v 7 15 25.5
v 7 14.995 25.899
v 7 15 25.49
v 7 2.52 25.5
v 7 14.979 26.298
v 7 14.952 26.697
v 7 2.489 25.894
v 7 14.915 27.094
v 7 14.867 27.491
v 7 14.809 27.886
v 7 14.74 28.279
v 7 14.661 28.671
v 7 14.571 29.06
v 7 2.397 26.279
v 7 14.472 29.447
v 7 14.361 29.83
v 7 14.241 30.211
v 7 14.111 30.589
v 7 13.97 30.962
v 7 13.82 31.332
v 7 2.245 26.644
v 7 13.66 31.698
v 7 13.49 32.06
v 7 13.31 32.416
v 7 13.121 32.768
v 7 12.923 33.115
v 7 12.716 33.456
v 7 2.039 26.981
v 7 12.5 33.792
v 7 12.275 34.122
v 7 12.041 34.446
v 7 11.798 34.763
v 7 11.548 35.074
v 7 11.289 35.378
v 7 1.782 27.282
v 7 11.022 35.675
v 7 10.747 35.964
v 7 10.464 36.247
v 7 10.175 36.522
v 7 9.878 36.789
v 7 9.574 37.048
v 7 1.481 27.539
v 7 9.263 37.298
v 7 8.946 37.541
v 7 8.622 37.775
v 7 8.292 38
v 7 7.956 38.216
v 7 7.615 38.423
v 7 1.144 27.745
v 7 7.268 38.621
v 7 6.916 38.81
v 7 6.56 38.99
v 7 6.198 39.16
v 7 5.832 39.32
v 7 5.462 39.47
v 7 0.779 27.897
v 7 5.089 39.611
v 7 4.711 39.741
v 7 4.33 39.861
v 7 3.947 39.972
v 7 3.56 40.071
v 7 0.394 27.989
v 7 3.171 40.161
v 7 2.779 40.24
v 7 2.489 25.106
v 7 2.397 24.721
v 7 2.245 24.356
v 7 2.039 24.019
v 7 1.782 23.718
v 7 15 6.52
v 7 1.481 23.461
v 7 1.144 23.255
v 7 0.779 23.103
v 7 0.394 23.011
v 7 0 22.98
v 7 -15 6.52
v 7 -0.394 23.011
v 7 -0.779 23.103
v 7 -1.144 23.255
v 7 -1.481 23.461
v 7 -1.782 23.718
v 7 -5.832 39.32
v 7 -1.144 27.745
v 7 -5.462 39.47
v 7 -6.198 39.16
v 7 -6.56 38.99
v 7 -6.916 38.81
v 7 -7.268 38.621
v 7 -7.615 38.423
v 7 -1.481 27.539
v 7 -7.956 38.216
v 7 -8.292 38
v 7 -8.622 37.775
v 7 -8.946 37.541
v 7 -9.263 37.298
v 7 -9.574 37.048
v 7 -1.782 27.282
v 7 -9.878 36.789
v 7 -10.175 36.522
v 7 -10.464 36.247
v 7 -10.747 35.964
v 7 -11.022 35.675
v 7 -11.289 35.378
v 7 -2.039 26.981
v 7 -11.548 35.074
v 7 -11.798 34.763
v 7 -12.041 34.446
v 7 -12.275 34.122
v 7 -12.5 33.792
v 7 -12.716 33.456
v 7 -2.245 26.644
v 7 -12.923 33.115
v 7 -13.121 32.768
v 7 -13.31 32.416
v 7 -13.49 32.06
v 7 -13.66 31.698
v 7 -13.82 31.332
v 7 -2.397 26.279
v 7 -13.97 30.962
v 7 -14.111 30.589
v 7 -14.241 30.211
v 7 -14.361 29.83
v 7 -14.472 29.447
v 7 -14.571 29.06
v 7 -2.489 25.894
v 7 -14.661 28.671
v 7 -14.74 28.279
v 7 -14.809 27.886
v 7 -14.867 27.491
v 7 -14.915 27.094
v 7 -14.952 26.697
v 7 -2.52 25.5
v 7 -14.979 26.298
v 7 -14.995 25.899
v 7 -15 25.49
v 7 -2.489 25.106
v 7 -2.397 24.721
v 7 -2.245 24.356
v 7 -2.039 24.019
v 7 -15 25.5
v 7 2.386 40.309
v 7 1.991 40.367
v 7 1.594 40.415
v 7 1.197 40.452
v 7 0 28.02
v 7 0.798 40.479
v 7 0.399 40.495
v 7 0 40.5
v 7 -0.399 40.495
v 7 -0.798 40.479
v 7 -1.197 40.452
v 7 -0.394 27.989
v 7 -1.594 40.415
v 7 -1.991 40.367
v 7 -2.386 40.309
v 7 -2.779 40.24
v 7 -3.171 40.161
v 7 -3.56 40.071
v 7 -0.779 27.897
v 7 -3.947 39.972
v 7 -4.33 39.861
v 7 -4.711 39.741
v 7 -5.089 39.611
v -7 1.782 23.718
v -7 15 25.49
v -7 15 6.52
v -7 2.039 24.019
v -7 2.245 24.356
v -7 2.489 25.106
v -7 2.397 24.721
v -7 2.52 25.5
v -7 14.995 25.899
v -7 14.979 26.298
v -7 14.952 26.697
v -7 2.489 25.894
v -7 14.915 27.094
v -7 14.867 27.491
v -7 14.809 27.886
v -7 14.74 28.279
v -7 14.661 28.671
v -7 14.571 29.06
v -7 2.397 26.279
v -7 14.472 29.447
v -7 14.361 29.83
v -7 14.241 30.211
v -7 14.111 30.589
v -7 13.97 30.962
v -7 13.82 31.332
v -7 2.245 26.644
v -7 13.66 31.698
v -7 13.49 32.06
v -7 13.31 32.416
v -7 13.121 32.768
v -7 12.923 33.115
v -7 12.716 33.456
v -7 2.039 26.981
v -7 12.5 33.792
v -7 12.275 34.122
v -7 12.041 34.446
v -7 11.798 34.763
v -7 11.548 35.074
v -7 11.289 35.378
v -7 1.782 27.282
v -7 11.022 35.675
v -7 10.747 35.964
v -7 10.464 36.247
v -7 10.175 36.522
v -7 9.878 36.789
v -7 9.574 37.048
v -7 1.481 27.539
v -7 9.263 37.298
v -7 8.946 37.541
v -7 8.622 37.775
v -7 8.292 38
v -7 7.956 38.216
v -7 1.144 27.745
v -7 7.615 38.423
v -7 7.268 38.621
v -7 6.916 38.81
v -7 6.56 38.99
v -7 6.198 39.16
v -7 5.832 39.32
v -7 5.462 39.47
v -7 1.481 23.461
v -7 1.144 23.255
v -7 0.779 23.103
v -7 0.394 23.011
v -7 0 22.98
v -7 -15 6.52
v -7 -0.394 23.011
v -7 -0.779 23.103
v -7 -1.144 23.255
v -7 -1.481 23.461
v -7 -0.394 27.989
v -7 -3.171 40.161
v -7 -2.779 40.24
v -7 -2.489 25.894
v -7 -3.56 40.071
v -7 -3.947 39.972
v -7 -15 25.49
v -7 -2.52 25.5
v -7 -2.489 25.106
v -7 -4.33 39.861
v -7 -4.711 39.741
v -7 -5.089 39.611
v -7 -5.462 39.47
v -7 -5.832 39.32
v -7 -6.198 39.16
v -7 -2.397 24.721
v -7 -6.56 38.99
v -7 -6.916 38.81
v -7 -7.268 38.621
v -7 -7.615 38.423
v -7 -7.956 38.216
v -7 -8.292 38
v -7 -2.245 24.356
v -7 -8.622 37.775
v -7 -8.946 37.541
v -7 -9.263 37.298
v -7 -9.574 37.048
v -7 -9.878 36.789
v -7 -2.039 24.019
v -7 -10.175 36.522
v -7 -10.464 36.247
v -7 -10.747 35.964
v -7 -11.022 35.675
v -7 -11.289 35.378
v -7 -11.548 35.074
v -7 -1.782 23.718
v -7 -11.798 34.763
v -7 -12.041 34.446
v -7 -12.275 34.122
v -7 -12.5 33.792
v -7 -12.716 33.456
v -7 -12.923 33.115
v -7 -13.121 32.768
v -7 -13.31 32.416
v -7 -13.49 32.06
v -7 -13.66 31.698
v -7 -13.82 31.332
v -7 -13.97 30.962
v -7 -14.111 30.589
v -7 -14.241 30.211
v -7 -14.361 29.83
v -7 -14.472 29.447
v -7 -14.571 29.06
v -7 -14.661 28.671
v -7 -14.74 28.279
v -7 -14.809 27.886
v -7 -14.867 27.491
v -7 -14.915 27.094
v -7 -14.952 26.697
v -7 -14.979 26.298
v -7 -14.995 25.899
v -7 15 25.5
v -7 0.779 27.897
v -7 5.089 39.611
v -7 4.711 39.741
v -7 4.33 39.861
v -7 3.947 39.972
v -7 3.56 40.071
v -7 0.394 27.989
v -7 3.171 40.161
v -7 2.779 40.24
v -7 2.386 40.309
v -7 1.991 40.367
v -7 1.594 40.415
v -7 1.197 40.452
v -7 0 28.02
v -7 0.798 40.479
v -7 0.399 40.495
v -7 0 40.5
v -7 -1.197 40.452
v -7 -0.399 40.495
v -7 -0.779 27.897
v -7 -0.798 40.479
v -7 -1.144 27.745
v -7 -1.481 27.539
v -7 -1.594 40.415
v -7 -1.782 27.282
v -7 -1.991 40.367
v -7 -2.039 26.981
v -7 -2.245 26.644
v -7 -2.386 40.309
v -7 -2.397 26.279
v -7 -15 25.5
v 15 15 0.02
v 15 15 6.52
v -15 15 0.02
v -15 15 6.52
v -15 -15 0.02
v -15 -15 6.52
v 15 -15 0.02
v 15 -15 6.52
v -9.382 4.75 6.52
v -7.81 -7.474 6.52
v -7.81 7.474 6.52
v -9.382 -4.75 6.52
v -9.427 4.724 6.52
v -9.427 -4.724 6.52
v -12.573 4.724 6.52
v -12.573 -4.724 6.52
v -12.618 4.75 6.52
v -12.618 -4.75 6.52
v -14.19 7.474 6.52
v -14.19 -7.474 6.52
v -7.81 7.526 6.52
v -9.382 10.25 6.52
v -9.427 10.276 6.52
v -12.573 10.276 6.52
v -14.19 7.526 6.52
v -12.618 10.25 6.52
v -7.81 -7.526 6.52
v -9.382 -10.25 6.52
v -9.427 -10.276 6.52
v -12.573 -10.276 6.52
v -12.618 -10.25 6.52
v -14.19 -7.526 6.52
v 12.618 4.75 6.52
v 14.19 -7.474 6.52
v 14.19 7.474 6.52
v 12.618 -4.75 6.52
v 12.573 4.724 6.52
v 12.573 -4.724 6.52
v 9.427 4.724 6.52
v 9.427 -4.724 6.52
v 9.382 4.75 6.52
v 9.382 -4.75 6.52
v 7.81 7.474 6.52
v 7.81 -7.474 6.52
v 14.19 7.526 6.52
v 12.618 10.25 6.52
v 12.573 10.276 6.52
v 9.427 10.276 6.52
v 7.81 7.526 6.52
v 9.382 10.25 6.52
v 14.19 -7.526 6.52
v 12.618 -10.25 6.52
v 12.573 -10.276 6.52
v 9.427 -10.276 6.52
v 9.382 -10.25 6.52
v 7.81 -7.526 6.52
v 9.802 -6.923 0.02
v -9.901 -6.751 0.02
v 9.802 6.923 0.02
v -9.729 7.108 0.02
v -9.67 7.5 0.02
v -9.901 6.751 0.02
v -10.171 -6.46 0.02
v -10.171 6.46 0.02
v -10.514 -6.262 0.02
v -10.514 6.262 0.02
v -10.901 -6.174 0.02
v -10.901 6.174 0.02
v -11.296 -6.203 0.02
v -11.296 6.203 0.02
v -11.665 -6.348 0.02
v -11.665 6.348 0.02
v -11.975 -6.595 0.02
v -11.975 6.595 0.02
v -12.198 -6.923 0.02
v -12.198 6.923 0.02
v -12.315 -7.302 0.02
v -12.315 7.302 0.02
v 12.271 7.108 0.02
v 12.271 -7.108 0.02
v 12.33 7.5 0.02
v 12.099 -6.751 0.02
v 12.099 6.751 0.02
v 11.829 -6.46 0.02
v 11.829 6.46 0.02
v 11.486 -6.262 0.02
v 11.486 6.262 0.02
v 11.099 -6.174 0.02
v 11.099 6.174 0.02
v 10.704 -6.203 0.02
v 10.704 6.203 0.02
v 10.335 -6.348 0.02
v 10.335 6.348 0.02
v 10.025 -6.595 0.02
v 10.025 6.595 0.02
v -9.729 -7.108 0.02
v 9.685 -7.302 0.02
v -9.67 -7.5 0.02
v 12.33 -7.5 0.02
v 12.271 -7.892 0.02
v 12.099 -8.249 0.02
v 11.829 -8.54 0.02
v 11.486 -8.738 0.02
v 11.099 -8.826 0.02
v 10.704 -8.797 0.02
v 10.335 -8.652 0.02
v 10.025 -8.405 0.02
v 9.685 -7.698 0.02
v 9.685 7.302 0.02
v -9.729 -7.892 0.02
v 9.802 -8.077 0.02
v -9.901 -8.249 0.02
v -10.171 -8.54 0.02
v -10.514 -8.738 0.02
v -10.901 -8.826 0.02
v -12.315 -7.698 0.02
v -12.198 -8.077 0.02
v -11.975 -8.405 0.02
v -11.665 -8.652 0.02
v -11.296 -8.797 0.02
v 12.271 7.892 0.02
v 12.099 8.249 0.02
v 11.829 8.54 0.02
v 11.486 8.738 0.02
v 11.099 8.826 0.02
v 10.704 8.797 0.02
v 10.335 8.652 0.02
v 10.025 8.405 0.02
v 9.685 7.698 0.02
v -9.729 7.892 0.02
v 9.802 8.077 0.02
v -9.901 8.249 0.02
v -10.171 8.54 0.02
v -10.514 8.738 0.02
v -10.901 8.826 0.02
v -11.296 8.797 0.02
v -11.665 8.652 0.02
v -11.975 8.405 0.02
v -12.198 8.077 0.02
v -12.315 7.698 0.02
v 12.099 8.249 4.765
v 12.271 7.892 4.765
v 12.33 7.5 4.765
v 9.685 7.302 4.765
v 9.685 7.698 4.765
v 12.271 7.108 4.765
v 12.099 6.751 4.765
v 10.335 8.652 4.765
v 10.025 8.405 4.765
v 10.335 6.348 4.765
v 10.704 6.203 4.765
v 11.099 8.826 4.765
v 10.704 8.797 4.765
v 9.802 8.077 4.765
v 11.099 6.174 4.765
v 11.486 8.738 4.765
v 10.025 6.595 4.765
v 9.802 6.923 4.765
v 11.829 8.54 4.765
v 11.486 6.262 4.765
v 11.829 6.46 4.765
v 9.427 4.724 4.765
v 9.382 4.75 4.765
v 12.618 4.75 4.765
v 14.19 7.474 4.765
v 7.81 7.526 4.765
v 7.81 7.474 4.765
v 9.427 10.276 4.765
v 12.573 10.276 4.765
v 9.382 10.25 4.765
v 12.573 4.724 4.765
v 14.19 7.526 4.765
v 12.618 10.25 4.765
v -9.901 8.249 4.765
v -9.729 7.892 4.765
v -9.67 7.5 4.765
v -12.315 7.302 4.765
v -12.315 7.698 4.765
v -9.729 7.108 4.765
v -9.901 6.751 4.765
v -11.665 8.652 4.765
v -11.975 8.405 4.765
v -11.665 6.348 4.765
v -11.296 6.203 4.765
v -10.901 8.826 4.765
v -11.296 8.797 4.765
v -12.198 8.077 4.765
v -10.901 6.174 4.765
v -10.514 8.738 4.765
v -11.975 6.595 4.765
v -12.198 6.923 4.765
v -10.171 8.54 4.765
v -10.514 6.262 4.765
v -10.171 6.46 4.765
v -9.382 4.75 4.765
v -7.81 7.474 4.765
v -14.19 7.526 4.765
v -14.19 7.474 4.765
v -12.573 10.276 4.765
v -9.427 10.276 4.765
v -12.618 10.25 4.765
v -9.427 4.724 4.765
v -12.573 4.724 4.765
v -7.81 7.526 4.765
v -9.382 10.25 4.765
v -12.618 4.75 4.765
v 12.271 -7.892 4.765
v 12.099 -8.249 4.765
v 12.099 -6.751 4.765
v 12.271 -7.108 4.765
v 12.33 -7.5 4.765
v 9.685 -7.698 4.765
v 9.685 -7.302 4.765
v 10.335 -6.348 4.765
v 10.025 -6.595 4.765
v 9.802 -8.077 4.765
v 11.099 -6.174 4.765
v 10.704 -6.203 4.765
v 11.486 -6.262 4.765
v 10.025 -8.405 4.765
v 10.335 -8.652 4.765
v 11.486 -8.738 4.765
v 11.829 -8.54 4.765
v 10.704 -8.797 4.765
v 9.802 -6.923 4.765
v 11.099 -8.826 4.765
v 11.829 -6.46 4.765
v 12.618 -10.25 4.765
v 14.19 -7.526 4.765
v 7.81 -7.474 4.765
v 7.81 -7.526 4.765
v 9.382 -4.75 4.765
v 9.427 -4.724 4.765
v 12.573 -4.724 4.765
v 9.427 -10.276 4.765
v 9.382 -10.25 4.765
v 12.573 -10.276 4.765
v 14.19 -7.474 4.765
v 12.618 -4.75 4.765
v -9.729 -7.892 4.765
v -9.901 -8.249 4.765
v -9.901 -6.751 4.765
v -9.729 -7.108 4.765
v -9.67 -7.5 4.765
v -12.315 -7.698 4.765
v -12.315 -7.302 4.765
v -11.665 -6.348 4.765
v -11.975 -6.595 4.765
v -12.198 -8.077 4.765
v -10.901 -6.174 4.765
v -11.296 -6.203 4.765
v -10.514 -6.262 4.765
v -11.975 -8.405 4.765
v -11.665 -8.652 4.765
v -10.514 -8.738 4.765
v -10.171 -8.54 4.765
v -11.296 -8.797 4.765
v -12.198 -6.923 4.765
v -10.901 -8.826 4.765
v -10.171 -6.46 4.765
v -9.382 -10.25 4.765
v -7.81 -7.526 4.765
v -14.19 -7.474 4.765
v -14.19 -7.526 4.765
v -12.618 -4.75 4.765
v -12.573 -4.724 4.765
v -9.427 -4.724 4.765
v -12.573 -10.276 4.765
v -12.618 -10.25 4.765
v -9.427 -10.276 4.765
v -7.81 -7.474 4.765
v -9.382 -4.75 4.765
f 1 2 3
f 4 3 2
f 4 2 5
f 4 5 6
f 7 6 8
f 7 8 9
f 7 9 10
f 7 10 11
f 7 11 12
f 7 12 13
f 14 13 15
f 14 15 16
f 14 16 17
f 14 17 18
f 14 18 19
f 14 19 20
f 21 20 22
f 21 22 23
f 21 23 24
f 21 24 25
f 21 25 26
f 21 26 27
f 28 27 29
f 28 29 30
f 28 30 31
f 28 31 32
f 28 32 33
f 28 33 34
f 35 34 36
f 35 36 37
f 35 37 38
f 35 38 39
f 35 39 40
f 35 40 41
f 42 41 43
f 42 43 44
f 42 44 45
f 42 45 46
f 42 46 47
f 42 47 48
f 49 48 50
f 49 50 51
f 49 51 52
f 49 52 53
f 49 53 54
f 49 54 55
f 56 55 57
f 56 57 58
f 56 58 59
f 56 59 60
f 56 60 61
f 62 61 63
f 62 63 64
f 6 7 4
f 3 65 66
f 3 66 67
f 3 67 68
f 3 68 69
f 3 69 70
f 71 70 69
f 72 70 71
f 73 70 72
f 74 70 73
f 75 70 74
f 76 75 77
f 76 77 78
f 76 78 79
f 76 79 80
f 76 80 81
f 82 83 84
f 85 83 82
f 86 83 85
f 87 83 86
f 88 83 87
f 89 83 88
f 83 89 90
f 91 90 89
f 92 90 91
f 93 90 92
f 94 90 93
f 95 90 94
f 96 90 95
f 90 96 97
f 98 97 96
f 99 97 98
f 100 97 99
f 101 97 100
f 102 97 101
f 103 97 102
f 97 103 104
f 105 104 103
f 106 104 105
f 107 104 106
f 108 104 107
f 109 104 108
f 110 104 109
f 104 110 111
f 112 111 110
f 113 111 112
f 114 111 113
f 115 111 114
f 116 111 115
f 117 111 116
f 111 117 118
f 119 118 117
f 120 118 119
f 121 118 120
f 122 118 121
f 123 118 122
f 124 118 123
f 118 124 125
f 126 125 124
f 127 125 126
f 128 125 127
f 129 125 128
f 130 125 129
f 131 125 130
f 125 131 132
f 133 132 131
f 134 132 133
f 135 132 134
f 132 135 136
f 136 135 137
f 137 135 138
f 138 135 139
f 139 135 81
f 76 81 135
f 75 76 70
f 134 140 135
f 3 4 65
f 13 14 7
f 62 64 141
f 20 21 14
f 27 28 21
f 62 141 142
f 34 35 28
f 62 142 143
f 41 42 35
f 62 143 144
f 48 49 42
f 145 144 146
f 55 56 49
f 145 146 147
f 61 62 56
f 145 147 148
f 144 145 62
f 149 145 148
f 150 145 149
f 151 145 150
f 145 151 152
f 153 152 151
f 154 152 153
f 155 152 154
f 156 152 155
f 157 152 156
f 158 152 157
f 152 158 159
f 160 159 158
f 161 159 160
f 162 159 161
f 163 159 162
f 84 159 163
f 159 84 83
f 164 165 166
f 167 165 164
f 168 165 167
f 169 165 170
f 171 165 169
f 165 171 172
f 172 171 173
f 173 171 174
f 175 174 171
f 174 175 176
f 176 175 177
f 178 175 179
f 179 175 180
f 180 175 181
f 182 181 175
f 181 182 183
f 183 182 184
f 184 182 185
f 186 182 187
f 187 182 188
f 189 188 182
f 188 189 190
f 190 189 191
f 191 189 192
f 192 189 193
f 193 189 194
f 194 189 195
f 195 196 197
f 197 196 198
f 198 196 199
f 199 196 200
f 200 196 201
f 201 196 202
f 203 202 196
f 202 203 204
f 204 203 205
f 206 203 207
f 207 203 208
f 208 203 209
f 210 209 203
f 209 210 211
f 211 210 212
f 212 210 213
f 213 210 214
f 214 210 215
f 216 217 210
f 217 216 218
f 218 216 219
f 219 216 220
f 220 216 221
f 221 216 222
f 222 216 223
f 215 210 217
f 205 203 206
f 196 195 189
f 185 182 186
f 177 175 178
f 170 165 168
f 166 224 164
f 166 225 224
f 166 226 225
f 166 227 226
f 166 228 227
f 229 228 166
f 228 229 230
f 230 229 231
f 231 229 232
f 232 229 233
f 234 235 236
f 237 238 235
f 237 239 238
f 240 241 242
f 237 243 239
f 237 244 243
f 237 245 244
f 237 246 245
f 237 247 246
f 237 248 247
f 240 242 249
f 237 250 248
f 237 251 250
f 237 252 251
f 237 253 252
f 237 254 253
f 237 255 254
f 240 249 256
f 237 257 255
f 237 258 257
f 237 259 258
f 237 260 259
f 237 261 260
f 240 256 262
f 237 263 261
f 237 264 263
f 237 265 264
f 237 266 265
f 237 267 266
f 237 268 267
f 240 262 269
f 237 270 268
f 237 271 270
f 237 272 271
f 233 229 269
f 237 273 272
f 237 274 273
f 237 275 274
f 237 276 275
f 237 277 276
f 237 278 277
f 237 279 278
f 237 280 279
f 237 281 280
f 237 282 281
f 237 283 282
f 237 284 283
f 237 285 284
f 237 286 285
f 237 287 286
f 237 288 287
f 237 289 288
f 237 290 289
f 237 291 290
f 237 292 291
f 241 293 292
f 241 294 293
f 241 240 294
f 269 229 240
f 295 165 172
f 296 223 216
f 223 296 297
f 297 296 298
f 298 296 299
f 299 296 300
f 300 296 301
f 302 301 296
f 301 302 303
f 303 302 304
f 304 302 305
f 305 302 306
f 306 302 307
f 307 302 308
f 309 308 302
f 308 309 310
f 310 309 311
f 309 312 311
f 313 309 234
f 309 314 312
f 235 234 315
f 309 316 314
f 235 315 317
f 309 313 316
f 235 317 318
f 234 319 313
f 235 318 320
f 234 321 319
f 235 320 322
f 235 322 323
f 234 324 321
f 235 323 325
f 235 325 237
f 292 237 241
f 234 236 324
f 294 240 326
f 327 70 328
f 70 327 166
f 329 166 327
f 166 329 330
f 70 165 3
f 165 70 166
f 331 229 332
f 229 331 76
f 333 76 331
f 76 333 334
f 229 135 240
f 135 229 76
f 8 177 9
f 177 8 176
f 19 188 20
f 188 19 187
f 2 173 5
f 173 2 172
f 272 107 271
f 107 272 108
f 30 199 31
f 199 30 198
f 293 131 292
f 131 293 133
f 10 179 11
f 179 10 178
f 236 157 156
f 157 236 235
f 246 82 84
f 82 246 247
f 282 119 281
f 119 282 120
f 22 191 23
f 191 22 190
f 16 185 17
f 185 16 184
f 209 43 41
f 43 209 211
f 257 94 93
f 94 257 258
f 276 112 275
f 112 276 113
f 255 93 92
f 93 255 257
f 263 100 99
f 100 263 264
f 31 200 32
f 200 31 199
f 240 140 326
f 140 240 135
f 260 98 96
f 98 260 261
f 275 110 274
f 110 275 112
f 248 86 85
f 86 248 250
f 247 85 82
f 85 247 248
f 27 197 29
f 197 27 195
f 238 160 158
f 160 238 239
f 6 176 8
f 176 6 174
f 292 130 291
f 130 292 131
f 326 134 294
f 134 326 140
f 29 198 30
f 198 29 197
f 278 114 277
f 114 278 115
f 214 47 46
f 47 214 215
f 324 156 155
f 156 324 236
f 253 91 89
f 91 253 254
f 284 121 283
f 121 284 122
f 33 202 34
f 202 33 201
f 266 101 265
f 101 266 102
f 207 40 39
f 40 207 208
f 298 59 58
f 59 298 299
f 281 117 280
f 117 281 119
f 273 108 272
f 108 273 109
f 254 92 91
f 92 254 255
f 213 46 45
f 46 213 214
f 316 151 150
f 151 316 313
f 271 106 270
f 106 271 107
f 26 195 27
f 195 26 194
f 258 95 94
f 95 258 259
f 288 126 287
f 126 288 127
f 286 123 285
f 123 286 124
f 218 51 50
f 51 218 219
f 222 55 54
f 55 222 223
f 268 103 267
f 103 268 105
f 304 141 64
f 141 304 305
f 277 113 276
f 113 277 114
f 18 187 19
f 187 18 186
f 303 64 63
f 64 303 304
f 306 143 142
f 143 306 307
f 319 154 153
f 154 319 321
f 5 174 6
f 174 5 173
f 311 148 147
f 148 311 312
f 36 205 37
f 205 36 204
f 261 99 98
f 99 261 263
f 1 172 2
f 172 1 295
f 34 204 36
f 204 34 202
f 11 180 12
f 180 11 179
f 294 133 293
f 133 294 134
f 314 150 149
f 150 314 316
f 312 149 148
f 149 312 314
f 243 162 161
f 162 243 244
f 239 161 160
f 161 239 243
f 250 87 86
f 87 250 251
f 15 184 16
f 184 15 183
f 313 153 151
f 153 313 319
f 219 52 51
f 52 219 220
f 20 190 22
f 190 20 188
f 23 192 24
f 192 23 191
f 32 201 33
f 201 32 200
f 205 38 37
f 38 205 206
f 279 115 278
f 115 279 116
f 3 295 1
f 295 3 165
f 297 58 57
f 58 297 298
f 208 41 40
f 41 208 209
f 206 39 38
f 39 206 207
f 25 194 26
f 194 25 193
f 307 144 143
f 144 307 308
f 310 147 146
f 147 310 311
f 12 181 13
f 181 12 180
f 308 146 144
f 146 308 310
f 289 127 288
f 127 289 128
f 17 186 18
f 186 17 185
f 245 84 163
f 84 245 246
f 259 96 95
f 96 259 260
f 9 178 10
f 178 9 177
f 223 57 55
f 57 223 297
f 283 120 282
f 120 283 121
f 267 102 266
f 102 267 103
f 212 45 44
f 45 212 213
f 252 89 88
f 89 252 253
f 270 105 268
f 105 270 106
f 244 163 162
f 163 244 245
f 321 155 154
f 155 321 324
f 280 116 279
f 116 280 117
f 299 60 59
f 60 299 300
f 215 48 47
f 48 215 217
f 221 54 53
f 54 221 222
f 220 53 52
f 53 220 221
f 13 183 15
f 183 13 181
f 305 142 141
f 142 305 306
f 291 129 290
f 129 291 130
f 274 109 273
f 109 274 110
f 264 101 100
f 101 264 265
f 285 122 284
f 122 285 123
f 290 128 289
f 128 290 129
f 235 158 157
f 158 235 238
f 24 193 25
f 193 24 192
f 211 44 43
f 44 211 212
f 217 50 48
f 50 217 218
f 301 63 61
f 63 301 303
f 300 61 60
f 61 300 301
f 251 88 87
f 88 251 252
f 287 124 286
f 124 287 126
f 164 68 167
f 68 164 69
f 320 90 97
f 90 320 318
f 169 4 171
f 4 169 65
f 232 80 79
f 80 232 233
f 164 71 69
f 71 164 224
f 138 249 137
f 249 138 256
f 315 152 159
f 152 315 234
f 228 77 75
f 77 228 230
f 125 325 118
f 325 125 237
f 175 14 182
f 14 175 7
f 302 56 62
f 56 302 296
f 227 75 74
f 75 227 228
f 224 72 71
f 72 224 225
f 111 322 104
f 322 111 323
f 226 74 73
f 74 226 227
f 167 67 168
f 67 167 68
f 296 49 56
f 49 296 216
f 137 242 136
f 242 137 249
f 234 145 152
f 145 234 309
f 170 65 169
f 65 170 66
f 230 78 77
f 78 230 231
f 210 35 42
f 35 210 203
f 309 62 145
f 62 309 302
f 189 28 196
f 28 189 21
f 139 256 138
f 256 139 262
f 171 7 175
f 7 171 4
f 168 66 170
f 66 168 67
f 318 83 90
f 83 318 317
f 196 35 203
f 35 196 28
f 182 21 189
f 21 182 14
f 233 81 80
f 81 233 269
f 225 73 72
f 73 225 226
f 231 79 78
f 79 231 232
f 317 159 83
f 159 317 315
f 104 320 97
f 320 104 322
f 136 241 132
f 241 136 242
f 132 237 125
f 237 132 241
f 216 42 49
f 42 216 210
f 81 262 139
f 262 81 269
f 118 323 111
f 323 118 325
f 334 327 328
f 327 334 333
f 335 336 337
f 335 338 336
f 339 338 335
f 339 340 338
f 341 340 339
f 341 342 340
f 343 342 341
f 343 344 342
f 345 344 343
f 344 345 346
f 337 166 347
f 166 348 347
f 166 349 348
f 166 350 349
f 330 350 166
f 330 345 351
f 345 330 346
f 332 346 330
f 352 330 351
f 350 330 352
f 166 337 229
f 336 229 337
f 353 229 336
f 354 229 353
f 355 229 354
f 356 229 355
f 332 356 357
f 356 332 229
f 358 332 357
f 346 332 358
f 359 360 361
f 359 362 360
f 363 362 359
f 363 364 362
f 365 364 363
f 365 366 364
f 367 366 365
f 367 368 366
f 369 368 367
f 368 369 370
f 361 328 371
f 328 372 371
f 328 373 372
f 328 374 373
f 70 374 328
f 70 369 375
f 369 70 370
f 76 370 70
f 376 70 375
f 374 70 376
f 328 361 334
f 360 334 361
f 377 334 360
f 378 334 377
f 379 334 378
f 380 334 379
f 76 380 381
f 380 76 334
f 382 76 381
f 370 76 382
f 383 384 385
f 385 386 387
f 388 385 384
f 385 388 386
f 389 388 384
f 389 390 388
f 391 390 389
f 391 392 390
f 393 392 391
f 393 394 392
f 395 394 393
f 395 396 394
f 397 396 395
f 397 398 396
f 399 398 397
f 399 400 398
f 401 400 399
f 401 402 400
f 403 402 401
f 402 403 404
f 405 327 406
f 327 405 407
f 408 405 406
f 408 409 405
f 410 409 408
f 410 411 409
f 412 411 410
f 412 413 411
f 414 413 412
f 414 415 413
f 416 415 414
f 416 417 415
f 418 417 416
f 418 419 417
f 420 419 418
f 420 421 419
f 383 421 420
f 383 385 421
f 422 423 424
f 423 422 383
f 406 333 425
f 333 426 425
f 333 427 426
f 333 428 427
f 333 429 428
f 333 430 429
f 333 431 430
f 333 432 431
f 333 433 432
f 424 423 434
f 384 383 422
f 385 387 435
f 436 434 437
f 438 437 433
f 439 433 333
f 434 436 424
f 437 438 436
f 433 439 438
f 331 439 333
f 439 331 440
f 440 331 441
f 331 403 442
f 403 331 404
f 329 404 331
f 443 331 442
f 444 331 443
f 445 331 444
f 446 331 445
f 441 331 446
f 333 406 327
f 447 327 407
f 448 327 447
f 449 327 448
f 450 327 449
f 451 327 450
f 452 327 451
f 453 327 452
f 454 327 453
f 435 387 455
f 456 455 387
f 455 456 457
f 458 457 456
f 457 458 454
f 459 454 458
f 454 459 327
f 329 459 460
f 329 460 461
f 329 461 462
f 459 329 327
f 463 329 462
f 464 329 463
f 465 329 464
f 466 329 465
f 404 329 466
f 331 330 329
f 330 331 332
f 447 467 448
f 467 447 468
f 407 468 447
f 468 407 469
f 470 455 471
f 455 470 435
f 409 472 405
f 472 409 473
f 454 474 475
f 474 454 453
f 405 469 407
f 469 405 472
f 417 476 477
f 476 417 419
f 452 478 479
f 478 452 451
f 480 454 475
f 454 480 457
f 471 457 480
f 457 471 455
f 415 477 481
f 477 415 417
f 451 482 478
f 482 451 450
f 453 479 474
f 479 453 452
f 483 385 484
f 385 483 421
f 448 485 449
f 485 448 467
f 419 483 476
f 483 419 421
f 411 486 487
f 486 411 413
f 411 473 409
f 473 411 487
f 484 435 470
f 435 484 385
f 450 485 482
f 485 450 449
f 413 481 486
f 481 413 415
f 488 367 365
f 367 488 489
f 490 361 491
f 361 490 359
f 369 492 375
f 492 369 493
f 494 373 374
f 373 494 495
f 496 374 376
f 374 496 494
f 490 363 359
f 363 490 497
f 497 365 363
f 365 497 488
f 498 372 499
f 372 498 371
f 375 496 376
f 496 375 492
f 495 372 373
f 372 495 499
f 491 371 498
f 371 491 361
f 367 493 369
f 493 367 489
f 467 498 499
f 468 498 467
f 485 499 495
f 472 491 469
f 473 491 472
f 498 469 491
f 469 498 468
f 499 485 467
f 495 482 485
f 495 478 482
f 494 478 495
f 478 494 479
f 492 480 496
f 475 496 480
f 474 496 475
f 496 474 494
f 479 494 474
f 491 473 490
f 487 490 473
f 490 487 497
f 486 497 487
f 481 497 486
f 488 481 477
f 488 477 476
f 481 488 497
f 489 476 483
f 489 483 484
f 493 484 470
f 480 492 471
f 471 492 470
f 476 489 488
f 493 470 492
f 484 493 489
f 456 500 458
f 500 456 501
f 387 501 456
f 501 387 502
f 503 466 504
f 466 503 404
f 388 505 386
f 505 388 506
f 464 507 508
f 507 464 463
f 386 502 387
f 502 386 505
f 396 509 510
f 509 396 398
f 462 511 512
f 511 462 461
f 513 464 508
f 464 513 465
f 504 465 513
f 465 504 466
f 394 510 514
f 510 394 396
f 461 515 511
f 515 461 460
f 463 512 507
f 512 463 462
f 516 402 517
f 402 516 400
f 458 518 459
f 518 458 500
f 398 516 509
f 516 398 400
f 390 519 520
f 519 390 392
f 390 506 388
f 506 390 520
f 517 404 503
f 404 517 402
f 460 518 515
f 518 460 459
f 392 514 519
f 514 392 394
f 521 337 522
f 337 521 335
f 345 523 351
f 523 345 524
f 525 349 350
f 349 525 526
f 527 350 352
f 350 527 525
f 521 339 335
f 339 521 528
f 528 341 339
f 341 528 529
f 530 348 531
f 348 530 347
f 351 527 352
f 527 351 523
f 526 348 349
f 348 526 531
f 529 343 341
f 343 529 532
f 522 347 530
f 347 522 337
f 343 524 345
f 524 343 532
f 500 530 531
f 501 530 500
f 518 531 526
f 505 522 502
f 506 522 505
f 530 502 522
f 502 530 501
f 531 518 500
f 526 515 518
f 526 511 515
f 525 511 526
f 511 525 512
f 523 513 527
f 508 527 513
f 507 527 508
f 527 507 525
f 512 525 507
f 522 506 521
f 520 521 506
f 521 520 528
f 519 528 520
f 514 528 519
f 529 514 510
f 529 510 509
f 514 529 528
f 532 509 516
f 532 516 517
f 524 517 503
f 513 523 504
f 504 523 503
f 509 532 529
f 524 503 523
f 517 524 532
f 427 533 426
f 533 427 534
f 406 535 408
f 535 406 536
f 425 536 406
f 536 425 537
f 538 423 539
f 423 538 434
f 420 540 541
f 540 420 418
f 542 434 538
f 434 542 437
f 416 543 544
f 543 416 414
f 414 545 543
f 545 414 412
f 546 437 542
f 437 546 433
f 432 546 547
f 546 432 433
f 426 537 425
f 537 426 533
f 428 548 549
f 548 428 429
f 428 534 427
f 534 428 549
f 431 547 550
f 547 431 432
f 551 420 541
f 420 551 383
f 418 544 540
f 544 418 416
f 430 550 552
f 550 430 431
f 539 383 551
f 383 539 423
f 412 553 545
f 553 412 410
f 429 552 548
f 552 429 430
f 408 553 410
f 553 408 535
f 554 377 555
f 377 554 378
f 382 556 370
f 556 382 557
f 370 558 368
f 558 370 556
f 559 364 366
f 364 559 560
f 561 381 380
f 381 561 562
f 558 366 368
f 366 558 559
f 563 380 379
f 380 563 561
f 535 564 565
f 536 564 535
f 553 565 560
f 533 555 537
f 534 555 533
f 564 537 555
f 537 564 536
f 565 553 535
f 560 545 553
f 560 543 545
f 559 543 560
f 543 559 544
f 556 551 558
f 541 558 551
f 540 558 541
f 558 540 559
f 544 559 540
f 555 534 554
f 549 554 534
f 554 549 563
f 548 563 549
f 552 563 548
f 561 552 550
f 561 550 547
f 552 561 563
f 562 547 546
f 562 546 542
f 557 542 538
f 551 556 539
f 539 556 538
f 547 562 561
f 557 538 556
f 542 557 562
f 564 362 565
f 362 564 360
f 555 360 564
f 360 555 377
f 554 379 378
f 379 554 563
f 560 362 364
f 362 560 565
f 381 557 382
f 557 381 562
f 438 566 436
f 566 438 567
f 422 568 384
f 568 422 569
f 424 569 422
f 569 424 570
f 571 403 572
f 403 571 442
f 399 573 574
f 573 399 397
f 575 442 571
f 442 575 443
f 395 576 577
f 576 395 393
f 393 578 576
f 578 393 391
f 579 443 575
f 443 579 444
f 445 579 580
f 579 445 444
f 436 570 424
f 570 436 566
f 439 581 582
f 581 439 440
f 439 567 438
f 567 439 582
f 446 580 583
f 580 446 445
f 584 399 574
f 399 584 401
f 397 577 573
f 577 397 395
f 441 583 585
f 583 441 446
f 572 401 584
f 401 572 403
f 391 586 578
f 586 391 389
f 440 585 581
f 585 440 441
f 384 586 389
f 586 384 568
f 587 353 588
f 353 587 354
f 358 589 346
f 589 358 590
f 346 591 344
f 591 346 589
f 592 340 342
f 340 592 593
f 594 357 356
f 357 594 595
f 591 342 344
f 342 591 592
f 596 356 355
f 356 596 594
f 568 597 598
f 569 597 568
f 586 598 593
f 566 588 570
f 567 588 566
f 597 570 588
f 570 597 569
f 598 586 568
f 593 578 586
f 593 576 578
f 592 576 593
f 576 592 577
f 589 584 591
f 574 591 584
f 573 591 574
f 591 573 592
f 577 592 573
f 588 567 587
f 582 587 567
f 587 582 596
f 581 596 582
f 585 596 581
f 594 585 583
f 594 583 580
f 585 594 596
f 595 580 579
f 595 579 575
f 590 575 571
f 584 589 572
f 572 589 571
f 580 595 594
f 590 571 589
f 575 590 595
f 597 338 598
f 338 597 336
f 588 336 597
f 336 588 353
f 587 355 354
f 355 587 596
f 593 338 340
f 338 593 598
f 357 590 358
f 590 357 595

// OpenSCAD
$fa = 1;
$fs = 0.4;

module phex(wid,rad,height){
hull(){
translate([wid/2-rad,0,0])cylinder(r=rad,h=height);
rotate([0,0,60])translate([wid/2-rad,0,0])cylinder(r=rad,h=height);
rotate([0,0,120])translate([wid/2-rad,0,0])cylinder(r=rad,h=height);
rotate([0,0,180])translate([wid/2-rad,0,0])cylinder(r=rad,h=height);
rotate([0,0,240])translate([wid/2-rad,0,0])cylinder(r=rad,h=height);
rotate([0,0,300])translate([wid/2-rad,0,0])cylinder(r=rad,h=height);

}
}

module fhex(wid,height){
hull(){
cube([wid/1.7,wid,height],center = true);
rotate([0,0,120])cube([wid/1.7,wid,height],center = true);
rotate([0,0,240])cube([wid/1.7,wid,height],center = true);
}
}



translate([0,0,19/2+6.5-0.01])

difference(){
cube([14,30,19],center=true);

translate([0,0,19/2])
rotate([0,90,0])
cylinder(h=14+0.001,r=5.04/2,center=true);

}



translate([0,0,19+6.5])
rotate([0,90,0])
difference(){
cylinder(h=14,r=15,center=true);
cylinder(h=14+0.001,r=5.04/2,center=true);
}

translate([0,0,6.5/2+0.02])
difference(){
color([1,0,0])cube([30,30,6.5],center=true);

translate([11,7.5,0])
cylinder(h=15,r=2.66/2,center=true);
translate([11,7.5,2.5])
fhex(5.5,2+0.01);  

translate([-11,7.5,0])
cylinder(h=15,r=2.66/2,center=true);
translate([-11,7.5,2.5])
fhex(5.5,2+0.01);  

translate([11,-7.5,0])
cylinder(h=15,r=2.66/2,center=true);
translate([11,-7.5,2.5])
fhex(5.5,2+0.01);      
    
translate([-11,-7.5,0])
cylinder(h=15,r=2.66/2,center=true);
translate([-11,-7.5,2.5])    
fhex(5.5,2+0.01);          

}



//Díametro de agujeros pequeños son para metrica fina 3
